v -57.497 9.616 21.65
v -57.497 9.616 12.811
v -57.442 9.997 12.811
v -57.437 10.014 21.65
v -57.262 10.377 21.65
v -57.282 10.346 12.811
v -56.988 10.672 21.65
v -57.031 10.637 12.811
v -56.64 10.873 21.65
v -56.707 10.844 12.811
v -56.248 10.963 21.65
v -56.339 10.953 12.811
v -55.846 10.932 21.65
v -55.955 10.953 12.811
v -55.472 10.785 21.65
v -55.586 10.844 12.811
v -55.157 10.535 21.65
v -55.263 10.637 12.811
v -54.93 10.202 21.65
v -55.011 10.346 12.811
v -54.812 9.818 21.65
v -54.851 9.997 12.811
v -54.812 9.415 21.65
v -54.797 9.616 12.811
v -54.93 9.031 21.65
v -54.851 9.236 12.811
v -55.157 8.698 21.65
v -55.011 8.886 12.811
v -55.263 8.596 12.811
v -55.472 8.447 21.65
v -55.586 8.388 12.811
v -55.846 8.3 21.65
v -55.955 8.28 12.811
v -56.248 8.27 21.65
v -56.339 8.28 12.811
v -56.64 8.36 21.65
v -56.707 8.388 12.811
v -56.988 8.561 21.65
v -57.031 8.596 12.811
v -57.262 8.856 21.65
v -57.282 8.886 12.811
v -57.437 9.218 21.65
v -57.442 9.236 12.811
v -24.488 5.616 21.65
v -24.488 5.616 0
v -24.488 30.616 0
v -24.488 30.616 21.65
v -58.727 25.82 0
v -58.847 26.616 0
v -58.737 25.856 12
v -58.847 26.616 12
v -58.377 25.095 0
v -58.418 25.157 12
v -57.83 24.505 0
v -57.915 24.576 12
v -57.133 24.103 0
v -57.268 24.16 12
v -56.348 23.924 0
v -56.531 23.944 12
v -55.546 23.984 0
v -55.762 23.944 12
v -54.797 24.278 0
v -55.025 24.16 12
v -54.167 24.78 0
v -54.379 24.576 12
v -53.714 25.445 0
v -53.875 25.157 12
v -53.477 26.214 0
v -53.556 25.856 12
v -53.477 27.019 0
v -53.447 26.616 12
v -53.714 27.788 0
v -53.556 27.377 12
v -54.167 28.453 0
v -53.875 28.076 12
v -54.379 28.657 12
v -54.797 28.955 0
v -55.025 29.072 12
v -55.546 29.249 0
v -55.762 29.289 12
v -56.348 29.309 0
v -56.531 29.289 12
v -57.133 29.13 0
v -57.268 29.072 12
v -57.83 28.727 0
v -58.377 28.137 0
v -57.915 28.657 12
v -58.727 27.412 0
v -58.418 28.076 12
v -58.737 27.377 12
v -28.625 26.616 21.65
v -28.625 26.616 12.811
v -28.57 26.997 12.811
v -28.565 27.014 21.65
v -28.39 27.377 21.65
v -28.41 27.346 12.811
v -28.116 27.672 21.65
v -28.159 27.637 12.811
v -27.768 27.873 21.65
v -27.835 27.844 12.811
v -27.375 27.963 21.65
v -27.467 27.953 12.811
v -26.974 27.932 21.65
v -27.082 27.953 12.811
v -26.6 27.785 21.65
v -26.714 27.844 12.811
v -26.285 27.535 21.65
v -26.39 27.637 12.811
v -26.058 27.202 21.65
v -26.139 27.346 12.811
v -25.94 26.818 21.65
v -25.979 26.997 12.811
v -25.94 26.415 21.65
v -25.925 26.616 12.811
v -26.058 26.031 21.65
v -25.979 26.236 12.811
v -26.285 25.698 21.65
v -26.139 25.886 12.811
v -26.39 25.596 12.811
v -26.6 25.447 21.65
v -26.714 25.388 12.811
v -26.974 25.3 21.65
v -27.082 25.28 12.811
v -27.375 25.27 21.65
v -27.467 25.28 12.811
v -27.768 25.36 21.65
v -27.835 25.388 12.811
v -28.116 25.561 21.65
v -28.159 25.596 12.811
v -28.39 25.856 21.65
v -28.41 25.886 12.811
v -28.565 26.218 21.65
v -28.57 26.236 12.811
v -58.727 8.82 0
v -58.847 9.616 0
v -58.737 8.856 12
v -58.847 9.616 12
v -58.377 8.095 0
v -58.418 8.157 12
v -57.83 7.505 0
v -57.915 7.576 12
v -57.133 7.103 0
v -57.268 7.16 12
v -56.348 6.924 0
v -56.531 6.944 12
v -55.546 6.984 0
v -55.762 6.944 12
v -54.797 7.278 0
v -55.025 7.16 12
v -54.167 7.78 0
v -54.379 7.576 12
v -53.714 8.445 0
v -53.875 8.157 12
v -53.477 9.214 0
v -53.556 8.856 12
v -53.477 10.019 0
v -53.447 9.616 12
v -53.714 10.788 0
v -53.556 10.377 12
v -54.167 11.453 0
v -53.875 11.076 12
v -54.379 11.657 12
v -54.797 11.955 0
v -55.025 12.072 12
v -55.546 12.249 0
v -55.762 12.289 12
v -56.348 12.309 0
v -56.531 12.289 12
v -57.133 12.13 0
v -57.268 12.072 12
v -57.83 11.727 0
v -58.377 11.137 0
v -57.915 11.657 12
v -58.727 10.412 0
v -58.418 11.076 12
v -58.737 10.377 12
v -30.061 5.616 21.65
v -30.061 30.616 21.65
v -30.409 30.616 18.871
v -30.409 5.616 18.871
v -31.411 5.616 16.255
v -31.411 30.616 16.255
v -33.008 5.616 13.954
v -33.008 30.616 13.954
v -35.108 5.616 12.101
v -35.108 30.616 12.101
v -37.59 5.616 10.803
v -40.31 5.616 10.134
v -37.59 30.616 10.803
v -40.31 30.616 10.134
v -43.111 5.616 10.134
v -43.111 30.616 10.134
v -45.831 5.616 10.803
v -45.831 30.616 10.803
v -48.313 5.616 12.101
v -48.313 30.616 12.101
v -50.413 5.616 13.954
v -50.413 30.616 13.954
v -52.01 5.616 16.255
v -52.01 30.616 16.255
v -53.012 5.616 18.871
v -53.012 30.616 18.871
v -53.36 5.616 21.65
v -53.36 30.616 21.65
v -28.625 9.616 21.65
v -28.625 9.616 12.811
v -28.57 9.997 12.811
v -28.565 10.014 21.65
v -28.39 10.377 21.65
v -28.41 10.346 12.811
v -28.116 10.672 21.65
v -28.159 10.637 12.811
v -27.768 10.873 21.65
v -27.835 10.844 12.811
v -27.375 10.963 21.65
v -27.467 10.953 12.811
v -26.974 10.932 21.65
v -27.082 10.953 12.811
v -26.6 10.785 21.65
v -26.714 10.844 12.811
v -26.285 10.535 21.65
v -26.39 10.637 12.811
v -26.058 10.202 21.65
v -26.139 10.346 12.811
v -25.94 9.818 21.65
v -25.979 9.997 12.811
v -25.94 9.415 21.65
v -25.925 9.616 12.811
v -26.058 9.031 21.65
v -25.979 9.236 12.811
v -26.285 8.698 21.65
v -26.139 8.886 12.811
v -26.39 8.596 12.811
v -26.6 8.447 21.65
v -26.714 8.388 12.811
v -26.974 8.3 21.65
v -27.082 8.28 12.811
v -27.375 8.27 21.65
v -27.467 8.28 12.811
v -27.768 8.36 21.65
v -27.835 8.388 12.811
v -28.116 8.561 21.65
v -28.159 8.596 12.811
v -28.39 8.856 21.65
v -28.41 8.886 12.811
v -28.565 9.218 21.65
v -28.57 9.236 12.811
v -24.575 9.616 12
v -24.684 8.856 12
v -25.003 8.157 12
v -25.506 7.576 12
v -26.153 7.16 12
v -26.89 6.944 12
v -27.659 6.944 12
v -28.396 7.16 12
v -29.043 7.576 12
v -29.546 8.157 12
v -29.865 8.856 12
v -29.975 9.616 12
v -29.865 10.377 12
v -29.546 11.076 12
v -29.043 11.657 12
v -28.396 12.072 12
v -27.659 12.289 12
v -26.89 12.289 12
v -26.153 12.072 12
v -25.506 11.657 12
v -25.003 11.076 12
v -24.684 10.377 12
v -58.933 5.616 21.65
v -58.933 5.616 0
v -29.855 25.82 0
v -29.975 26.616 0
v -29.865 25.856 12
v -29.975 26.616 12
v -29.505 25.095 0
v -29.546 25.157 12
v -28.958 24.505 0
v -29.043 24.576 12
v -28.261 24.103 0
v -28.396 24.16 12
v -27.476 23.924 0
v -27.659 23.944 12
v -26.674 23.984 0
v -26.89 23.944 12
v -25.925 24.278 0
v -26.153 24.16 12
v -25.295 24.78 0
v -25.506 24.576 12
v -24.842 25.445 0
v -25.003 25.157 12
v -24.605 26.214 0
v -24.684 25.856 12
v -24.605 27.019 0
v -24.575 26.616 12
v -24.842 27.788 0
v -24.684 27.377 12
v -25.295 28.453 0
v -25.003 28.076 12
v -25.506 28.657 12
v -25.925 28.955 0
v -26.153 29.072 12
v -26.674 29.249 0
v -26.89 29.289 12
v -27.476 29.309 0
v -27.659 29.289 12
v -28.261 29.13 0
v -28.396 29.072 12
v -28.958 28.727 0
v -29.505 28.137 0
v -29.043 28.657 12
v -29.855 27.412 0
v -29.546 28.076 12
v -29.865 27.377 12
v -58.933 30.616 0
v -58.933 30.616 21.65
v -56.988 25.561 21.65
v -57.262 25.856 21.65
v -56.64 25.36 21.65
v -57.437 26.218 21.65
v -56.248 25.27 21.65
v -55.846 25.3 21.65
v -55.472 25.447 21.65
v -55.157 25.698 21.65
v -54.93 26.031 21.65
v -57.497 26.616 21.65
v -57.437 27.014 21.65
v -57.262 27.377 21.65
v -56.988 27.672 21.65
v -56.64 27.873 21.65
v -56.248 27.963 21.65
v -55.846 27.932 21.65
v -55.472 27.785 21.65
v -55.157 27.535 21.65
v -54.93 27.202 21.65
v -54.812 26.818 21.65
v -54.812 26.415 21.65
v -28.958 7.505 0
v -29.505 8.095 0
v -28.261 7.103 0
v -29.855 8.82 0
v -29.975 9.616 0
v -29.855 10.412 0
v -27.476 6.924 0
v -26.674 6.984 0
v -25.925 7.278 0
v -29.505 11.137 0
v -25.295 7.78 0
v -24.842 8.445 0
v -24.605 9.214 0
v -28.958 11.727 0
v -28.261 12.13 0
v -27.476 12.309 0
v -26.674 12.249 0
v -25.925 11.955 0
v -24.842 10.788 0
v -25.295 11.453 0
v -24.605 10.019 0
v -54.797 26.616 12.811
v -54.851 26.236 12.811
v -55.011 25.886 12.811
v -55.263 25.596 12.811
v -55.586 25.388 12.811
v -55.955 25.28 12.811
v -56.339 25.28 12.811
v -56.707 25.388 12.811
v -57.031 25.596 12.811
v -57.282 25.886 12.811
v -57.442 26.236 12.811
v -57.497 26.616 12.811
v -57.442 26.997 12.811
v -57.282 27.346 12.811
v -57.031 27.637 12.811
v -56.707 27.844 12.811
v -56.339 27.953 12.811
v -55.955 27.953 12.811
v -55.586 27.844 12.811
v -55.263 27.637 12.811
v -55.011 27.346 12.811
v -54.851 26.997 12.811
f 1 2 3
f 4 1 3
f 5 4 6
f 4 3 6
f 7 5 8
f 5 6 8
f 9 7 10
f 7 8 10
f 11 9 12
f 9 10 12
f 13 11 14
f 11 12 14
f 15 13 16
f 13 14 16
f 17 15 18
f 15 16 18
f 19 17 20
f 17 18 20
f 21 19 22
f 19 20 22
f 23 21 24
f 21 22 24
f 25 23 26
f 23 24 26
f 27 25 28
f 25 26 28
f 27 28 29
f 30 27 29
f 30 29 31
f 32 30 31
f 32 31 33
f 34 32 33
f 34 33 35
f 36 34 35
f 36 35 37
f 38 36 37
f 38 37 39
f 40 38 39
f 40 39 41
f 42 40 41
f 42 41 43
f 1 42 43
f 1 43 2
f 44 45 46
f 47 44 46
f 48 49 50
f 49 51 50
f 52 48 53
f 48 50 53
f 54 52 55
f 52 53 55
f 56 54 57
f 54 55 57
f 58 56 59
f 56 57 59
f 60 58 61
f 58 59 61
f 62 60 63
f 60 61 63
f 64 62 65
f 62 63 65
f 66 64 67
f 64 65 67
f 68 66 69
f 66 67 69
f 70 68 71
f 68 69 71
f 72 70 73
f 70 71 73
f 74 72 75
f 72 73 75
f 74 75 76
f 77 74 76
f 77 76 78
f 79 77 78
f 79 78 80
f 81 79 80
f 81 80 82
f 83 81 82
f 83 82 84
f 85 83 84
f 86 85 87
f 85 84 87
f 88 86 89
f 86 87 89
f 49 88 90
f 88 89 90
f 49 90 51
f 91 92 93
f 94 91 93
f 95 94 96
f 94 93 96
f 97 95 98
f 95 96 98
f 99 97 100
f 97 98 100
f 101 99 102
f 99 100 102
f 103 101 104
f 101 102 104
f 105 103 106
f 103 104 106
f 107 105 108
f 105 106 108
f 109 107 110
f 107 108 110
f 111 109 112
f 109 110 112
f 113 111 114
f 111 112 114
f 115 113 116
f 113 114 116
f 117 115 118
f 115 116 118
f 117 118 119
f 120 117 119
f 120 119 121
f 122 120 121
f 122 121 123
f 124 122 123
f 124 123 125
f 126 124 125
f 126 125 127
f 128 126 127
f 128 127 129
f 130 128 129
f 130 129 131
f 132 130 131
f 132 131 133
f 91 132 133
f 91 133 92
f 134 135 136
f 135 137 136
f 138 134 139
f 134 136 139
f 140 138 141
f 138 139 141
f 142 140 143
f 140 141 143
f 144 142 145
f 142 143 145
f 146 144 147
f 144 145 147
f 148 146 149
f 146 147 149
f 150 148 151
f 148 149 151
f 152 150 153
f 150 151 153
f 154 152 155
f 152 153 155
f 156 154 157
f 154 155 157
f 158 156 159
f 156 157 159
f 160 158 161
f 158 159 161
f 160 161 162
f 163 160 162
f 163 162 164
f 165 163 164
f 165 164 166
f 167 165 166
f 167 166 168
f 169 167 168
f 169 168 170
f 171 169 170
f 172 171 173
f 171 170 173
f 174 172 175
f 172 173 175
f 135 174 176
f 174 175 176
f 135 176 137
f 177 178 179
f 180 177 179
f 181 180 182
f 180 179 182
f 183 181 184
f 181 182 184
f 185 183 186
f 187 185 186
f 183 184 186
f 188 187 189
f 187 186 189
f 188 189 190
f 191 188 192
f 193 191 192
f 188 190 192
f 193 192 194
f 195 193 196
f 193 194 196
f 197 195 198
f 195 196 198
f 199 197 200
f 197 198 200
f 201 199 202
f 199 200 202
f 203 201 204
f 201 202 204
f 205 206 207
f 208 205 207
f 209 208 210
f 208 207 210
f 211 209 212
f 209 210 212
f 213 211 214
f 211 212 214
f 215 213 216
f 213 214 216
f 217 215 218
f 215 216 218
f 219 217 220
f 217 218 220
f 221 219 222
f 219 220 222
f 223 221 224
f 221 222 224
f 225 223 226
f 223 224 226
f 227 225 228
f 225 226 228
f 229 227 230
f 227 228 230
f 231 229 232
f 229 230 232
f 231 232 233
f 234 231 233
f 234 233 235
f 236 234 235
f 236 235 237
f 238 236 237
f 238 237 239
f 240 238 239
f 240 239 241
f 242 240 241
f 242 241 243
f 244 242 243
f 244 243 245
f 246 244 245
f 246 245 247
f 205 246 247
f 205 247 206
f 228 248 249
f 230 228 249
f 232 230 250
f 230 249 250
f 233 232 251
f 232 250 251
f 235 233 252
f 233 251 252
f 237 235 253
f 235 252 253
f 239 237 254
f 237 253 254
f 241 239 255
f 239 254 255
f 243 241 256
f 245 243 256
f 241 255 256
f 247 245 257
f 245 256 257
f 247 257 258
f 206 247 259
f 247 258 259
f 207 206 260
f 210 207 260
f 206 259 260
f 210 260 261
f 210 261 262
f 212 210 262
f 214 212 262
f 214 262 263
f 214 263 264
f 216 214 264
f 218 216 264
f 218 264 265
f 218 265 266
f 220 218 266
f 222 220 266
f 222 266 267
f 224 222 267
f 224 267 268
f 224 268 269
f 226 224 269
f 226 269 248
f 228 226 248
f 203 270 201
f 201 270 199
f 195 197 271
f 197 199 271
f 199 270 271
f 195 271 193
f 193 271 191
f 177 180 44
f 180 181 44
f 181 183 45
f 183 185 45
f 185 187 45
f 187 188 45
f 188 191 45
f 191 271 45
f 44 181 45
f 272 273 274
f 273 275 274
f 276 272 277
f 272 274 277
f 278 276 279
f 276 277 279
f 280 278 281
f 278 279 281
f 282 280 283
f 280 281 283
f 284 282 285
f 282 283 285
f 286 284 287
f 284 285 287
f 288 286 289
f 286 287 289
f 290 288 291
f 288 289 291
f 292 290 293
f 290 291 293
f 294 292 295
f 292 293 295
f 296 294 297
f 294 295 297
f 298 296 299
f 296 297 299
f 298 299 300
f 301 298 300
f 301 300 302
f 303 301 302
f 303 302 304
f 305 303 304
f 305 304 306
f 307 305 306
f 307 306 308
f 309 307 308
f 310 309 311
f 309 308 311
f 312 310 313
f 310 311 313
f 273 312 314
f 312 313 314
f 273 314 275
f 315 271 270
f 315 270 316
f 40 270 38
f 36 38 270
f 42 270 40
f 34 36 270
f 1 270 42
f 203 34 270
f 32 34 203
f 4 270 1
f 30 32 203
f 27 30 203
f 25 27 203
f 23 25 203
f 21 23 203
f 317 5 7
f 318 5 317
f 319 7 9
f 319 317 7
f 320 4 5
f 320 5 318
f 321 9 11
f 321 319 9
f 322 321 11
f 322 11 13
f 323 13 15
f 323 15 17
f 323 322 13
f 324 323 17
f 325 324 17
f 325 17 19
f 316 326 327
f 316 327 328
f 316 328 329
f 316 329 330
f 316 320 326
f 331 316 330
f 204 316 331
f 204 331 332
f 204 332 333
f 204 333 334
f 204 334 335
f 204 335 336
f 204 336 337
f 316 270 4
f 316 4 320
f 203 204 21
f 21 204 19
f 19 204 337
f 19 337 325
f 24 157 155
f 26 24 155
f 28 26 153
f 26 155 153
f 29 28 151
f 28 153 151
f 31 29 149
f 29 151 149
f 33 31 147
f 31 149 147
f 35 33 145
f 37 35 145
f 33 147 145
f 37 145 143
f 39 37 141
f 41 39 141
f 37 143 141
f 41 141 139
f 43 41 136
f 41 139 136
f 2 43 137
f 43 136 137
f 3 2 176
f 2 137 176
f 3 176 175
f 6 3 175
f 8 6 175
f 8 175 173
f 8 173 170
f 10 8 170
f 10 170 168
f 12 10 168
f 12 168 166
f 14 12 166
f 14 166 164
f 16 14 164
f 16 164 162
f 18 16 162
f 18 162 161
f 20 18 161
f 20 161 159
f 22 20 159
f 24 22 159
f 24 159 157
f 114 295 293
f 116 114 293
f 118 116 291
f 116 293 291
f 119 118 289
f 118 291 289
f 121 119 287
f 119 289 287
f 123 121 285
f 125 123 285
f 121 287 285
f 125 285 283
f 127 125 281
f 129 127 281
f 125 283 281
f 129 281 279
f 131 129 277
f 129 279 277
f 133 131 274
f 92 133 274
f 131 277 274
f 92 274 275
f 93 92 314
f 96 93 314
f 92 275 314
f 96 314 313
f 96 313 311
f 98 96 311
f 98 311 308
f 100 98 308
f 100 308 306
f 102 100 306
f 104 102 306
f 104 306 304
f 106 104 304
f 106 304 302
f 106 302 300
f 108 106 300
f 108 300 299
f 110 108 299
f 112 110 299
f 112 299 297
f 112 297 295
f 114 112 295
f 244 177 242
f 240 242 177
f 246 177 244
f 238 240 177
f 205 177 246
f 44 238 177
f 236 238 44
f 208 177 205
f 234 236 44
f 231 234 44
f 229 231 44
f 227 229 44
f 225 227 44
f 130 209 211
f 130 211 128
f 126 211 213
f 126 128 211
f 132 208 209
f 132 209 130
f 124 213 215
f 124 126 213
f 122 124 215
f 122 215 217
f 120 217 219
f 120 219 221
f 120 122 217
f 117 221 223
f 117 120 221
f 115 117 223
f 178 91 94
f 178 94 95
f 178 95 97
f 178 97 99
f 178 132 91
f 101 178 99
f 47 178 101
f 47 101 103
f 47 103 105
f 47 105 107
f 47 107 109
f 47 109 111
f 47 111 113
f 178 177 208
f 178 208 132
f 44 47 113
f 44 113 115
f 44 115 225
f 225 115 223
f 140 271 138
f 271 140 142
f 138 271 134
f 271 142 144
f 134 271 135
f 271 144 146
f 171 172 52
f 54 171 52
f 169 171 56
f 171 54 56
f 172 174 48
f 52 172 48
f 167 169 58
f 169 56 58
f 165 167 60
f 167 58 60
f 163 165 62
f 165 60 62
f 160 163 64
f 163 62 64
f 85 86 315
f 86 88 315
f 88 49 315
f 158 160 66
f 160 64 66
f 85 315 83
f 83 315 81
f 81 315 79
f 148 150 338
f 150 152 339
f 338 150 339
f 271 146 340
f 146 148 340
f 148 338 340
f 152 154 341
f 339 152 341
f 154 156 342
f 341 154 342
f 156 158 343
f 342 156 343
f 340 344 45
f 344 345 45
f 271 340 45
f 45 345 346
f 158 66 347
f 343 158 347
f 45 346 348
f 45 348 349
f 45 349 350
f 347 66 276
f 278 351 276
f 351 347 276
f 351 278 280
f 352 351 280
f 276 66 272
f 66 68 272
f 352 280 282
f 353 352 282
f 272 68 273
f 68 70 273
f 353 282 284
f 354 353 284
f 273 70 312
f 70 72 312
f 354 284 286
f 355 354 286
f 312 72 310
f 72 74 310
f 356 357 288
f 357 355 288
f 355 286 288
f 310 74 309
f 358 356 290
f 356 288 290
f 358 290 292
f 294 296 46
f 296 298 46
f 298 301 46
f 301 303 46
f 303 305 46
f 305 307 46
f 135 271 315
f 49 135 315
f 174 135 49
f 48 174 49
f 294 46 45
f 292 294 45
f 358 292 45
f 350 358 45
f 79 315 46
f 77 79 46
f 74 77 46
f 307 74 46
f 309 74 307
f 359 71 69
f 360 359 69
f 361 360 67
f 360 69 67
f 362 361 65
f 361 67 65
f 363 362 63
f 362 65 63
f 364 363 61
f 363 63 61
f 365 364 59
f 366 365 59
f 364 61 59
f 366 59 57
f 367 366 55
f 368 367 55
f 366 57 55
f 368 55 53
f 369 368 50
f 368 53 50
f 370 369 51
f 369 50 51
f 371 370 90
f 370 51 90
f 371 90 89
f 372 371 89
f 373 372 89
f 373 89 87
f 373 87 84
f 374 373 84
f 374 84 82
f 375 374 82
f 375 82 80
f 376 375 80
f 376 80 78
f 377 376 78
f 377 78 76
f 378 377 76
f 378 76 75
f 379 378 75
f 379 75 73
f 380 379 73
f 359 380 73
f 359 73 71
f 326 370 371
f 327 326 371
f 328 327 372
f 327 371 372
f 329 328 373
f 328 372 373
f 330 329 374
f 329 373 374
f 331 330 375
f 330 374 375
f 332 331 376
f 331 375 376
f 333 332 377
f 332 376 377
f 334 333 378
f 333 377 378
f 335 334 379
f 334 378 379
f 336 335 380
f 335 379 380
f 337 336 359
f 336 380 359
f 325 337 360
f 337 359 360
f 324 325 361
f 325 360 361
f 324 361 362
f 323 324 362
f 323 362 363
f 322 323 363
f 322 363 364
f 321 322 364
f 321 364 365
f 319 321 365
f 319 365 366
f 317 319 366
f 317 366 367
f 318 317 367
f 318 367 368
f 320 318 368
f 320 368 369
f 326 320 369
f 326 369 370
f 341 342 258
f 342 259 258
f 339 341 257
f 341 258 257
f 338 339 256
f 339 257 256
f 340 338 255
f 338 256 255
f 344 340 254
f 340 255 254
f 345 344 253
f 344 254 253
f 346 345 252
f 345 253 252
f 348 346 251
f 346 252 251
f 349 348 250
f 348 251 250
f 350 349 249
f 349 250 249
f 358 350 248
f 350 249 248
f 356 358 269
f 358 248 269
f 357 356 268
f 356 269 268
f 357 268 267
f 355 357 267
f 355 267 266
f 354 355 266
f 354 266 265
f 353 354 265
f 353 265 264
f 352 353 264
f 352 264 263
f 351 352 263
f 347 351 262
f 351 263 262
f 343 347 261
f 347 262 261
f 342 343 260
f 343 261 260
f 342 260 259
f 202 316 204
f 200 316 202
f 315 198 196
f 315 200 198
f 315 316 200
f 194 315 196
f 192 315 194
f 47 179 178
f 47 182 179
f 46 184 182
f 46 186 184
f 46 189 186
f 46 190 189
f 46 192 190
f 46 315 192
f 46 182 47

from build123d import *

# Parameters (mm, degrees)
F0_W     = 34.4444442836
F0_H     = 25
F1_DEPTH = 21.65
F3_D     = 23.3
F5_D     = 2.7
F7_D     = 5.4
F7_DEPTH = 12
F7_TIP   = 1.6223236714


with BuildPart() as f1:
    # F0 (on Top) → F1 (new body)
    with BuildSketch(Plane.XY):
        with Locations((-41.7105928063, 18.1163050001)):
            Rectangle(F0_W, F0_H)
    extrude(amount=F1_DEPTH)

    # F3 (through all)
    with Locations(Plane.XZ.offset(-5.6163050001)):
        with Locations((-41.7105928063, 21.7)):
            Hole(F3_D / 2)

    # F5 (through all)
    with Locations(Plane.XY.offset(21.65)):
        with Locations((-56.1466502289, 26.6163050001), (-56.1466502289, 9.6163050001), (-27.2745353838, 9.6163050001), (-27.2745353838, 26.6163050001)):
            Hole(F5_D / 2)

    # F7
    with Locations(Plane(origin=(0, 0, 0), x_dir=(1, 0, 0), z_dir=(0, 0, -1))):
        with Locations((-56.1466502289, -9.6163050001), (-56.1466502289, -26.6163050001), (-27.2745353838, -26.6163050001), (-27.2745353838, -9.6163050001)):
            Hole(F7_D / 2, depth=F7_DEPTH)
            with Locations((0, 0, -(F7_DEPTH + F7_TIP / 2))):  # 118° drill point
                Cone(0, F7_D / 2, F7_TIP, mode=Mode.SUBTRACT)


solid = f1.part
